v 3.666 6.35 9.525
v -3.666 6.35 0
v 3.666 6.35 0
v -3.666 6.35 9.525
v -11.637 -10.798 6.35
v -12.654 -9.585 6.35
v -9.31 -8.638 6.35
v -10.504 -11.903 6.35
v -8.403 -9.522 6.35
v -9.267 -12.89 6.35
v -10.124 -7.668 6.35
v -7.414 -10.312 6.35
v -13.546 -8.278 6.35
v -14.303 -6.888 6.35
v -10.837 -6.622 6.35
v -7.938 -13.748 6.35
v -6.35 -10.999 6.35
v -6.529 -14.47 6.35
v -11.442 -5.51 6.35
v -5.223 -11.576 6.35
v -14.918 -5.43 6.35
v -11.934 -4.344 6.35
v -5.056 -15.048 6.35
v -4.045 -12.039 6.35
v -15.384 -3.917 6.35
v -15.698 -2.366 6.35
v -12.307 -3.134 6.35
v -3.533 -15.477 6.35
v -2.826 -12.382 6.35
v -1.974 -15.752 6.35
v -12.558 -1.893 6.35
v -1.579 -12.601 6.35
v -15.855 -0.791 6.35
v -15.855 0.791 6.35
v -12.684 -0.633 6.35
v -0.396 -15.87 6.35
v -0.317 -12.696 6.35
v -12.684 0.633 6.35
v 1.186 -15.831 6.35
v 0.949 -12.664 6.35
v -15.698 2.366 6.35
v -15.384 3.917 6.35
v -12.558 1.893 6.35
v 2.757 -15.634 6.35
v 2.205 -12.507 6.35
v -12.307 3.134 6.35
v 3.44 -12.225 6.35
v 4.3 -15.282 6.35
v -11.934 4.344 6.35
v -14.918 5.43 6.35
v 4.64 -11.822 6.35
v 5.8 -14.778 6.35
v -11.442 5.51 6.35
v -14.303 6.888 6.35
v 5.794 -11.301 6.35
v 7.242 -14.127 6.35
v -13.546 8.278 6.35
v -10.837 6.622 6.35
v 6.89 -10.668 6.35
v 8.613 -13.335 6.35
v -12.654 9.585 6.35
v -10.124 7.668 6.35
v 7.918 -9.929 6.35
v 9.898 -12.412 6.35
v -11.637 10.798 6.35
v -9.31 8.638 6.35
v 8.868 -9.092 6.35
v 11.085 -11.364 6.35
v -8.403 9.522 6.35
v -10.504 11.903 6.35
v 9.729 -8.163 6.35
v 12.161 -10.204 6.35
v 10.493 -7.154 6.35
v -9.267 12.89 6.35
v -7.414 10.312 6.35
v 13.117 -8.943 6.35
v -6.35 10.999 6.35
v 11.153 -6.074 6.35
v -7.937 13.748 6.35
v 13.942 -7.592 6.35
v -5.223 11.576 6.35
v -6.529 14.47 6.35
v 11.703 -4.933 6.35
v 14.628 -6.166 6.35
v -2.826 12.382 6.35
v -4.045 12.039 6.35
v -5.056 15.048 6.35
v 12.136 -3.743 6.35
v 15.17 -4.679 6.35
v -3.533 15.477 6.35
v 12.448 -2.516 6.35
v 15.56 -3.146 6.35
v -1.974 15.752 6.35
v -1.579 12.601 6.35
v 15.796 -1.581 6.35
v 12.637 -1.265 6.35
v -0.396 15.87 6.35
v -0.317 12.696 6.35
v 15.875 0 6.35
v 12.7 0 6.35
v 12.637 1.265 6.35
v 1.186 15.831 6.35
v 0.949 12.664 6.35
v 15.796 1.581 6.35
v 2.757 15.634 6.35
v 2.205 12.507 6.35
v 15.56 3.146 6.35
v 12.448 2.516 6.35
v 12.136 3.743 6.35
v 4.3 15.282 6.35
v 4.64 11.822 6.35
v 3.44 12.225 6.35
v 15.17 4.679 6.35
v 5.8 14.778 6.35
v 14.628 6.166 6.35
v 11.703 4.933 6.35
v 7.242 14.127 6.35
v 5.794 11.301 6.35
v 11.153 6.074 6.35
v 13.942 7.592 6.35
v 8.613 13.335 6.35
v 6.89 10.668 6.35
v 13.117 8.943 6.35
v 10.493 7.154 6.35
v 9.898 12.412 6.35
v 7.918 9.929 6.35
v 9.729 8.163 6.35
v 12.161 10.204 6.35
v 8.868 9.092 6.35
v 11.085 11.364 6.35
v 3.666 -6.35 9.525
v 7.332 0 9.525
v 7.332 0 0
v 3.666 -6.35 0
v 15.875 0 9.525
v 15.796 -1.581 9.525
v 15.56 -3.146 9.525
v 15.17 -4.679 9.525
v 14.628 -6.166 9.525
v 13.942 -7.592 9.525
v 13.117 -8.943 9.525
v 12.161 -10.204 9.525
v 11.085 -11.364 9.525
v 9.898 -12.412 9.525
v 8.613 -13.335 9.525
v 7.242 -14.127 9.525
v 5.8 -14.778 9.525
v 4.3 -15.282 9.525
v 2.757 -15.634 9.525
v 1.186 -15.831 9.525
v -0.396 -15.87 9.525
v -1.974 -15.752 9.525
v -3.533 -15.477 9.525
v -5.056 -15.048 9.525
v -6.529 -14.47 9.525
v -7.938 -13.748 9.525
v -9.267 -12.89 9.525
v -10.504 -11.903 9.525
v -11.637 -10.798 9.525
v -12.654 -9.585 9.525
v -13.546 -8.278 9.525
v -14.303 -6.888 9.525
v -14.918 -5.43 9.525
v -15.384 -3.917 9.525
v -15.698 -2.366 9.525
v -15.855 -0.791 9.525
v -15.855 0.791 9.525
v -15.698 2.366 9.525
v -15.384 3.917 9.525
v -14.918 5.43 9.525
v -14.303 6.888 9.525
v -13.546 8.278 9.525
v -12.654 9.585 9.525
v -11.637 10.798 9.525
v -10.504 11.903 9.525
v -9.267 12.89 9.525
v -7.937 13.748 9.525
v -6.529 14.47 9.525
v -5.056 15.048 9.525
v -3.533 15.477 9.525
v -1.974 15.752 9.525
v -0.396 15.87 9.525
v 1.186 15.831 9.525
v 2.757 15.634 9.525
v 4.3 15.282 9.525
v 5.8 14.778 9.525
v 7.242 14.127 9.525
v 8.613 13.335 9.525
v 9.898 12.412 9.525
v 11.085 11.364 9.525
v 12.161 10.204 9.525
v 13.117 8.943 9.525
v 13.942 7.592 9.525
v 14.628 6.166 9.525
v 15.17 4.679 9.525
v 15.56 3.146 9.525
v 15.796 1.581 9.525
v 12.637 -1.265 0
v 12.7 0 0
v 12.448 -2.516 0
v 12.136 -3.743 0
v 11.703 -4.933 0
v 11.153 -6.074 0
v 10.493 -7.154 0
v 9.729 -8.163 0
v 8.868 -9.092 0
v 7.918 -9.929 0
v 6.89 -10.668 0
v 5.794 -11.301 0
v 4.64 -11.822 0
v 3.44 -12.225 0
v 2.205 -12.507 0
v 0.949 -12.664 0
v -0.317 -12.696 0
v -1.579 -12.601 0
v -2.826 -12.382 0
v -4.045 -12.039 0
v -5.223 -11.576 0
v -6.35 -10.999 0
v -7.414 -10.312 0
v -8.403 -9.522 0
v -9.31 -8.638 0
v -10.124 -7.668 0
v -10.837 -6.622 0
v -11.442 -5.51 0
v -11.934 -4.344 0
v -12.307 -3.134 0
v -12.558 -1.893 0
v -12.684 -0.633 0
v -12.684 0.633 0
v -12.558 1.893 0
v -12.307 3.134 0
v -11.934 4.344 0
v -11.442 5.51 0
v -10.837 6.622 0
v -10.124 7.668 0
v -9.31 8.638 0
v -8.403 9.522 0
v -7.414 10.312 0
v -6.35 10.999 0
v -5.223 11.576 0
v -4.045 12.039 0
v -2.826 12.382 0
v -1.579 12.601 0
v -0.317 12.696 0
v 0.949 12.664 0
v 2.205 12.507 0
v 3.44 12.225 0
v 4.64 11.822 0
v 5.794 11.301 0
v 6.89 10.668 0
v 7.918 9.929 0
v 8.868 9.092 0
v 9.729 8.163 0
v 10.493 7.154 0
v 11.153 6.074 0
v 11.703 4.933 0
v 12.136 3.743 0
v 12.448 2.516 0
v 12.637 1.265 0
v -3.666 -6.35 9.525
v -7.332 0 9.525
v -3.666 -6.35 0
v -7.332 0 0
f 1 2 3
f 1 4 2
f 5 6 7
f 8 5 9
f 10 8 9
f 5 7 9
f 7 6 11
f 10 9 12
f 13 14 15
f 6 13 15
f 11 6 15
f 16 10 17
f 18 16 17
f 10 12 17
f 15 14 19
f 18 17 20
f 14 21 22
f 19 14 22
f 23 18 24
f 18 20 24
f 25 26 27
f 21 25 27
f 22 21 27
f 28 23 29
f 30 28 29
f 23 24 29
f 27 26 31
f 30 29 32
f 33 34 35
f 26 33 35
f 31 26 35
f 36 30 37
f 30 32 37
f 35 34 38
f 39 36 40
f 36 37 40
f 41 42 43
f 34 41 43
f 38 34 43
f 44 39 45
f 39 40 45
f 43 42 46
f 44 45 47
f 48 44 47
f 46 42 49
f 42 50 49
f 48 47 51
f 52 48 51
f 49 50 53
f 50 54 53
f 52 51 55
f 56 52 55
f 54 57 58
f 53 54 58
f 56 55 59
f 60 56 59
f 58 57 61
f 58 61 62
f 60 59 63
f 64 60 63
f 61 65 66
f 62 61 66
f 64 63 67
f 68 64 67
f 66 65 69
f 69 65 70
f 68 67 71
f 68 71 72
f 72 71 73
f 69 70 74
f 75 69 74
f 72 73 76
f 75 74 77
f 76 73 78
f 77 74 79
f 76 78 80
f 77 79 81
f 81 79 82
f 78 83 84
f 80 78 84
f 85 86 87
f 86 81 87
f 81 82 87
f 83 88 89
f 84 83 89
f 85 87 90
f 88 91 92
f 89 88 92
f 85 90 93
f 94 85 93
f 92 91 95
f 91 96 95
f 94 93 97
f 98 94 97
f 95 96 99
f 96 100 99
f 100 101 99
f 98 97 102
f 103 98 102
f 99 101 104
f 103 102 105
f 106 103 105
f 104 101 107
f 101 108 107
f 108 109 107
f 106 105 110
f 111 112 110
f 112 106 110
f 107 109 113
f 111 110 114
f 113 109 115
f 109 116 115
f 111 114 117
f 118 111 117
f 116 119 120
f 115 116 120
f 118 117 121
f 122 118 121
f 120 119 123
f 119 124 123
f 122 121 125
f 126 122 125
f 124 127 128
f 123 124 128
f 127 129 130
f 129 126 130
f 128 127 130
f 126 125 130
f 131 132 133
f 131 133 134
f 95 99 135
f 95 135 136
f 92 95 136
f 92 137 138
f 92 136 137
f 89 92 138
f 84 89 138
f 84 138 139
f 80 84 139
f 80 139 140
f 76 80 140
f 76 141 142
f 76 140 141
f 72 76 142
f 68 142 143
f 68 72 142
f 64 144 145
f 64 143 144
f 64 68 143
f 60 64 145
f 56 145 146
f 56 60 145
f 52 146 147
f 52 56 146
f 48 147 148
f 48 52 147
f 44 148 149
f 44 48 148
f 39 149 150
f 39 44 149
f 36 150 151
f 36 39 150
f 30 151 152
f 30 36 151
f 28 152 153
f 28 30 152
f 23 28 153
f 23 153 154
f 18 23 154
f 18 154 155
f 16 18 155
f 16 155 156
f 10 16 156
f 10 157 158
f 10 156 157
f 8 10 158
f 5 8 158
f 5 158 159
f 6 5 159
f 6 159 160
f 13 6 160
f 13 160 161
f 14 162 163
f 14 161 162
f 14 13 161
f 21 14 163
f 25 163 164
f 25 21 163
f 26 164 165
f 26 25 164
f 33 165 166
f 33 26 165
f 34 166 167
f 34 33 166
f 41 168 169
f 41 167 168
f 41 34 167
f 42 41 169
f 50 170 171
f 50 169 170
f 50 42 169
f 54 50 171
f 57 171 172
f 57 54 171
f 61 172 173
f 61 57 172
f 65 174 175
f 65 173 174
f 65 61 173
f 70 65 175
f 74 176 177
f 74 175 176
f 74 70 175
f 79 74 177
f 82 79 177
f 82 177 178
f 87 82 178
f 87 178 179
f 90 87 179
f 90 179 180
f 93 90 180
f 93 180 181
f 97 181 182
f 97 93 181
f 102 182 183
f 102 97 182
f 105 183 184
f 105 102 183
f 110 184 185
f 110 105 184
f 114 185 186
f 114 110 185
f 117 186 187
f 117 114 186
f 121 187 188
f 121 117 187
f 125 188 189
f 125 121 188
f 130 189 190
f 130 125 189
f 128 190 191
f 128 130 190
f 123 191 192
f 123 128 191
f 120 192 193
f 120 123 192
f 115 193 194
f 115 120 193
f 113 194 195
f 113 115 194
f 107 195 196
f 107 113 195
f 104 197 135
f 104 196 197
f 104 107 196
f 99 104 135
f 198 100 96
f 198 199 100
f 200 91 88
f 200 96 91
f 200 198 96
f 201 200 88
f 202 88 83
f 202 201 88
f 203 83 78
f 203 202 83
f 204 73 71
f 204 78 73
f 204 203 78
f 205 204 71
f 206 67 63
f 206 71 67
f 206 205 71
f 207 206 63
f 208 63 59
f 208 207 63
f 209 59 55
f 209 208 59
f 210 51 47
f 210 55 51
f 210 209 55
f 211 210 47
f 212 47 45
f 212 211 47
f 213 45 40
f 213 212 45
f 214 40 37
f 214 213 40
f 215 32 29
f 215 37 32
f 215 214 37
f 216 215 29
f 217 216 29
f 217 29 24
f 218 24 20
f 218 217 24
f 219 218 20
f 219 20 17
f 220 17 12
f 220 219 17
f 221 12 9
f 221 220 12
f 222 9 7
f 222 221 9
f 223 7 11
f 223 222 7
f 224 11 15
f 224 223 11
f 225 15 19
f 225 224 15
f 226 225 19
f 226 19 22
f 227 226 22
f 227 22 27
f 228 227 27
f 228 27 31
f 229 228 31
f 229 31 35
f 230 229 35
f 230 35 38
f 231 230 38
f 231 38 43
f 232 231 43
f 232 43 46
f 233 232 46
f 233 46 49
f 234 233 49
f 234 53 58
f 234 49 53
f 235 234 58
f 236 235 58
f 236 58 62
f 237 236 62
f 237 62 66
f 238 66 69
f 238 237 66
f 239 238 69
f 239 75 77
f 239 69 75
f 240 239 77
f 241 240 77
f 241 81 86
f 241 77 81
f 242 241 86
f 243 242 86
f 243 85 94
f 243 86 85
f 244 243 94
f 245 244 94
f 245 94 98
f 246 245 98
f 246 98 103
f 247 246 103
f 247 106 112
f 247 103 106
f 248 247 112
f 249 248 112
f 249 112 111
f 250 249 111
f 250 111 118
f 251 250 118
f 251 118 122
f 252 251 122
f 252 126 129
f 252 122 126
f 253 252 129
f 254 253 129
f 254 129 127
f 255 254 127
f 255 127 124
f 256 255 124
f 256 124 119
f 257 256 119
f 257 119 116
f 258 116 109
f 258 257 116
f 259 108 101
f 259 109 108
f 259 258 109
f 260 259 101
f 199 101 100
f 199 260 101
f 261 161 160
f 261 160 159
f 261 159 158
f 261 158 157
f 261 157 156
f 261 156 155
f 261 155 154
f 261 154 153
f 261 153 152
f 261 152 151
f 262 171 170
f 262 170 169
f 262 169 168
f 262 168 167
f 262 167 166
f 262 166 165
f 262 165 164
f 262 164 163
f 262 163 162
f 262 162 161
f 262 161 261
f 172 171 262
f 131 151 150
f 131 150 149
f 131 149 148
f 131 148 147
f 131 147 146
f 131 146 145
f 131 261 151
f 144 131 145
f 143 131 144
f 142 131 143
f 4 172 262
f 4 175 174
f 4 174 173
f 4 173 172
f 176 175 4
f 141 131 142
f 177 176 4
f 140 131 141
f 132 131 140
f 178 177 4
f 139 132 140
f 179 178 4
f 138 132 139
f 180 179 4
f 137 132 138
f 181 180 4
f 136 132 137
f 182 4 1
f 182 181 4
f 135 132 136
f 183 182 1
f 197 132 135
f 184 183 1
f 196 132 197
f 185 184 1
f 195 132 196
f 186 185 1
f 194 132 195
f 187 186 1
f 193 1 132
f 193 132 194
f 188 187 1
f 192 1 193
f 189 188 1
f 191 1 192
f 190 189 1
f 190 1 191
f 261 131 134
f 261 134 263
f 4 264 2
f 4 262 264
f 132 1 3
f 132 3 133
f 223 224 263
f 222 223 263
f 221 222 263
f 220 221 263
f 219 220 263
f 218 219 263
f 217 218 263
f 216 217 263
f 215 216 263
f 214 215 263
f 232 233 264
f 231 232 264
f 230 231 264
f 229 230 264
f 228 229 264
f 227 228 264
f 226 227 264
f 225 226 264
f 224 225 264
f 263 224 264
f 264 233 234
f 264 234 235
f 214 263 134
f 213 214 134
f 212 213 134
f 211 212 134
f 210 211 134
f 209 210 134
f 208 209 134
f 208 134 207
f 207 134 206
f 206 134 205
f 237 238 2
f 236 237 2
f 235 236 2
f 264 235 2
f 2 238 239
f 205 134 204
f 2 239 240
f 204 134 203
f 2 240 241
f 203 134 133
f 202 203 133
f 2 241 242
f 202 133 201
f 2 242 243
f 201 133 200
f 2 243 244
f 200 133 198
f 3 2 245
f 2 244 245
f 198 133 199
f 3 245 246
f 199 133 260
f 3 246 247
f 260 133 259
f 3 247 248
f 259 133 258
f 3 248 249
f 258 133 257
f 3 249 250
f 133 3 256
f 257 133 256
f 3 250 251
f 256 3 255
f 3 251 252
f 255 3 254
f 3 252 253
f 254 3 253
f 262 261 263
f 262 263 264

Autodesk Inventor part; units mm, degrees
ref_plane "YZ Plane" through (0, 0, 0) normal (1, 0, 0) x (0, 1, 0)
ref_plane "XZ Plane" through (0, 0, 0) normal (0, 1, 0) x (-1, 0, 0)
ref_plane "XY Plane" through (0, 0, 0) normal (0, 0, 1) x (1, 0, 0)
sketch "Sketch1" plane through (0, 0, 0) normal (0, 0, 1) x (1, 0, 0)
  circle A0 centre (0, 0) radius 12.7
  dimension "d0" = 25.4
extrude "Extrusion1" add sketch "Sketch1" along normal blind 6.35
sketch "Sketch2" plane through (0, 0, 6.35) normal (0, 0, 1) x (1, 0, 0)
  circle A0 centre (0, 0) radius 12.7 projected
  circle A1 centre (0, 0) radius 15.875
  dimension "d3" = 31.75
extrude "Extrusion2" add sketch "Sketch2" along normal blind 3.175
sketch "Sketch3" plane through (0, 0, 6.35) normal (0, 0, 1) x (1, 0, 0)
  circle A0 centre (0, 0) radius 12.7 projected
extrude "Extrusion3" add sketch "Sketch3" along normal blind 3.175
sketch "Sketch4" plane through (0, 0, 9.525) normal (0, 0, 1) x (1, 0, 0)
  circle A0 centre (0, 0) radius 15.875 projected
  line L0 (3.6662, 6.35) -> (7.3323, 0)
  line L1 (7.3323, 0) -> (3.6662, -6.35)
  line L2 (3.6662, -6.35) -> (-3.6662, -6.35)
  line L3 (-3.6662, -6.35) -> (-7.3323, 0)
  line L4 (-7.3323, 0) -> (-3.6662, 6.35)
  line L5 (-3.6662, 6.35) -> (3.6662, 6.35)
  line L6 (0, 0) -> (21.004, 0)
  dimension "d8" = 12.7
extrude "Extrusion4" cut sketch "Sketch4" against normal through all contours L1 L2 L3 L4 L5 L0
properties part number "Hex bearing" material "Iron, Cast"
